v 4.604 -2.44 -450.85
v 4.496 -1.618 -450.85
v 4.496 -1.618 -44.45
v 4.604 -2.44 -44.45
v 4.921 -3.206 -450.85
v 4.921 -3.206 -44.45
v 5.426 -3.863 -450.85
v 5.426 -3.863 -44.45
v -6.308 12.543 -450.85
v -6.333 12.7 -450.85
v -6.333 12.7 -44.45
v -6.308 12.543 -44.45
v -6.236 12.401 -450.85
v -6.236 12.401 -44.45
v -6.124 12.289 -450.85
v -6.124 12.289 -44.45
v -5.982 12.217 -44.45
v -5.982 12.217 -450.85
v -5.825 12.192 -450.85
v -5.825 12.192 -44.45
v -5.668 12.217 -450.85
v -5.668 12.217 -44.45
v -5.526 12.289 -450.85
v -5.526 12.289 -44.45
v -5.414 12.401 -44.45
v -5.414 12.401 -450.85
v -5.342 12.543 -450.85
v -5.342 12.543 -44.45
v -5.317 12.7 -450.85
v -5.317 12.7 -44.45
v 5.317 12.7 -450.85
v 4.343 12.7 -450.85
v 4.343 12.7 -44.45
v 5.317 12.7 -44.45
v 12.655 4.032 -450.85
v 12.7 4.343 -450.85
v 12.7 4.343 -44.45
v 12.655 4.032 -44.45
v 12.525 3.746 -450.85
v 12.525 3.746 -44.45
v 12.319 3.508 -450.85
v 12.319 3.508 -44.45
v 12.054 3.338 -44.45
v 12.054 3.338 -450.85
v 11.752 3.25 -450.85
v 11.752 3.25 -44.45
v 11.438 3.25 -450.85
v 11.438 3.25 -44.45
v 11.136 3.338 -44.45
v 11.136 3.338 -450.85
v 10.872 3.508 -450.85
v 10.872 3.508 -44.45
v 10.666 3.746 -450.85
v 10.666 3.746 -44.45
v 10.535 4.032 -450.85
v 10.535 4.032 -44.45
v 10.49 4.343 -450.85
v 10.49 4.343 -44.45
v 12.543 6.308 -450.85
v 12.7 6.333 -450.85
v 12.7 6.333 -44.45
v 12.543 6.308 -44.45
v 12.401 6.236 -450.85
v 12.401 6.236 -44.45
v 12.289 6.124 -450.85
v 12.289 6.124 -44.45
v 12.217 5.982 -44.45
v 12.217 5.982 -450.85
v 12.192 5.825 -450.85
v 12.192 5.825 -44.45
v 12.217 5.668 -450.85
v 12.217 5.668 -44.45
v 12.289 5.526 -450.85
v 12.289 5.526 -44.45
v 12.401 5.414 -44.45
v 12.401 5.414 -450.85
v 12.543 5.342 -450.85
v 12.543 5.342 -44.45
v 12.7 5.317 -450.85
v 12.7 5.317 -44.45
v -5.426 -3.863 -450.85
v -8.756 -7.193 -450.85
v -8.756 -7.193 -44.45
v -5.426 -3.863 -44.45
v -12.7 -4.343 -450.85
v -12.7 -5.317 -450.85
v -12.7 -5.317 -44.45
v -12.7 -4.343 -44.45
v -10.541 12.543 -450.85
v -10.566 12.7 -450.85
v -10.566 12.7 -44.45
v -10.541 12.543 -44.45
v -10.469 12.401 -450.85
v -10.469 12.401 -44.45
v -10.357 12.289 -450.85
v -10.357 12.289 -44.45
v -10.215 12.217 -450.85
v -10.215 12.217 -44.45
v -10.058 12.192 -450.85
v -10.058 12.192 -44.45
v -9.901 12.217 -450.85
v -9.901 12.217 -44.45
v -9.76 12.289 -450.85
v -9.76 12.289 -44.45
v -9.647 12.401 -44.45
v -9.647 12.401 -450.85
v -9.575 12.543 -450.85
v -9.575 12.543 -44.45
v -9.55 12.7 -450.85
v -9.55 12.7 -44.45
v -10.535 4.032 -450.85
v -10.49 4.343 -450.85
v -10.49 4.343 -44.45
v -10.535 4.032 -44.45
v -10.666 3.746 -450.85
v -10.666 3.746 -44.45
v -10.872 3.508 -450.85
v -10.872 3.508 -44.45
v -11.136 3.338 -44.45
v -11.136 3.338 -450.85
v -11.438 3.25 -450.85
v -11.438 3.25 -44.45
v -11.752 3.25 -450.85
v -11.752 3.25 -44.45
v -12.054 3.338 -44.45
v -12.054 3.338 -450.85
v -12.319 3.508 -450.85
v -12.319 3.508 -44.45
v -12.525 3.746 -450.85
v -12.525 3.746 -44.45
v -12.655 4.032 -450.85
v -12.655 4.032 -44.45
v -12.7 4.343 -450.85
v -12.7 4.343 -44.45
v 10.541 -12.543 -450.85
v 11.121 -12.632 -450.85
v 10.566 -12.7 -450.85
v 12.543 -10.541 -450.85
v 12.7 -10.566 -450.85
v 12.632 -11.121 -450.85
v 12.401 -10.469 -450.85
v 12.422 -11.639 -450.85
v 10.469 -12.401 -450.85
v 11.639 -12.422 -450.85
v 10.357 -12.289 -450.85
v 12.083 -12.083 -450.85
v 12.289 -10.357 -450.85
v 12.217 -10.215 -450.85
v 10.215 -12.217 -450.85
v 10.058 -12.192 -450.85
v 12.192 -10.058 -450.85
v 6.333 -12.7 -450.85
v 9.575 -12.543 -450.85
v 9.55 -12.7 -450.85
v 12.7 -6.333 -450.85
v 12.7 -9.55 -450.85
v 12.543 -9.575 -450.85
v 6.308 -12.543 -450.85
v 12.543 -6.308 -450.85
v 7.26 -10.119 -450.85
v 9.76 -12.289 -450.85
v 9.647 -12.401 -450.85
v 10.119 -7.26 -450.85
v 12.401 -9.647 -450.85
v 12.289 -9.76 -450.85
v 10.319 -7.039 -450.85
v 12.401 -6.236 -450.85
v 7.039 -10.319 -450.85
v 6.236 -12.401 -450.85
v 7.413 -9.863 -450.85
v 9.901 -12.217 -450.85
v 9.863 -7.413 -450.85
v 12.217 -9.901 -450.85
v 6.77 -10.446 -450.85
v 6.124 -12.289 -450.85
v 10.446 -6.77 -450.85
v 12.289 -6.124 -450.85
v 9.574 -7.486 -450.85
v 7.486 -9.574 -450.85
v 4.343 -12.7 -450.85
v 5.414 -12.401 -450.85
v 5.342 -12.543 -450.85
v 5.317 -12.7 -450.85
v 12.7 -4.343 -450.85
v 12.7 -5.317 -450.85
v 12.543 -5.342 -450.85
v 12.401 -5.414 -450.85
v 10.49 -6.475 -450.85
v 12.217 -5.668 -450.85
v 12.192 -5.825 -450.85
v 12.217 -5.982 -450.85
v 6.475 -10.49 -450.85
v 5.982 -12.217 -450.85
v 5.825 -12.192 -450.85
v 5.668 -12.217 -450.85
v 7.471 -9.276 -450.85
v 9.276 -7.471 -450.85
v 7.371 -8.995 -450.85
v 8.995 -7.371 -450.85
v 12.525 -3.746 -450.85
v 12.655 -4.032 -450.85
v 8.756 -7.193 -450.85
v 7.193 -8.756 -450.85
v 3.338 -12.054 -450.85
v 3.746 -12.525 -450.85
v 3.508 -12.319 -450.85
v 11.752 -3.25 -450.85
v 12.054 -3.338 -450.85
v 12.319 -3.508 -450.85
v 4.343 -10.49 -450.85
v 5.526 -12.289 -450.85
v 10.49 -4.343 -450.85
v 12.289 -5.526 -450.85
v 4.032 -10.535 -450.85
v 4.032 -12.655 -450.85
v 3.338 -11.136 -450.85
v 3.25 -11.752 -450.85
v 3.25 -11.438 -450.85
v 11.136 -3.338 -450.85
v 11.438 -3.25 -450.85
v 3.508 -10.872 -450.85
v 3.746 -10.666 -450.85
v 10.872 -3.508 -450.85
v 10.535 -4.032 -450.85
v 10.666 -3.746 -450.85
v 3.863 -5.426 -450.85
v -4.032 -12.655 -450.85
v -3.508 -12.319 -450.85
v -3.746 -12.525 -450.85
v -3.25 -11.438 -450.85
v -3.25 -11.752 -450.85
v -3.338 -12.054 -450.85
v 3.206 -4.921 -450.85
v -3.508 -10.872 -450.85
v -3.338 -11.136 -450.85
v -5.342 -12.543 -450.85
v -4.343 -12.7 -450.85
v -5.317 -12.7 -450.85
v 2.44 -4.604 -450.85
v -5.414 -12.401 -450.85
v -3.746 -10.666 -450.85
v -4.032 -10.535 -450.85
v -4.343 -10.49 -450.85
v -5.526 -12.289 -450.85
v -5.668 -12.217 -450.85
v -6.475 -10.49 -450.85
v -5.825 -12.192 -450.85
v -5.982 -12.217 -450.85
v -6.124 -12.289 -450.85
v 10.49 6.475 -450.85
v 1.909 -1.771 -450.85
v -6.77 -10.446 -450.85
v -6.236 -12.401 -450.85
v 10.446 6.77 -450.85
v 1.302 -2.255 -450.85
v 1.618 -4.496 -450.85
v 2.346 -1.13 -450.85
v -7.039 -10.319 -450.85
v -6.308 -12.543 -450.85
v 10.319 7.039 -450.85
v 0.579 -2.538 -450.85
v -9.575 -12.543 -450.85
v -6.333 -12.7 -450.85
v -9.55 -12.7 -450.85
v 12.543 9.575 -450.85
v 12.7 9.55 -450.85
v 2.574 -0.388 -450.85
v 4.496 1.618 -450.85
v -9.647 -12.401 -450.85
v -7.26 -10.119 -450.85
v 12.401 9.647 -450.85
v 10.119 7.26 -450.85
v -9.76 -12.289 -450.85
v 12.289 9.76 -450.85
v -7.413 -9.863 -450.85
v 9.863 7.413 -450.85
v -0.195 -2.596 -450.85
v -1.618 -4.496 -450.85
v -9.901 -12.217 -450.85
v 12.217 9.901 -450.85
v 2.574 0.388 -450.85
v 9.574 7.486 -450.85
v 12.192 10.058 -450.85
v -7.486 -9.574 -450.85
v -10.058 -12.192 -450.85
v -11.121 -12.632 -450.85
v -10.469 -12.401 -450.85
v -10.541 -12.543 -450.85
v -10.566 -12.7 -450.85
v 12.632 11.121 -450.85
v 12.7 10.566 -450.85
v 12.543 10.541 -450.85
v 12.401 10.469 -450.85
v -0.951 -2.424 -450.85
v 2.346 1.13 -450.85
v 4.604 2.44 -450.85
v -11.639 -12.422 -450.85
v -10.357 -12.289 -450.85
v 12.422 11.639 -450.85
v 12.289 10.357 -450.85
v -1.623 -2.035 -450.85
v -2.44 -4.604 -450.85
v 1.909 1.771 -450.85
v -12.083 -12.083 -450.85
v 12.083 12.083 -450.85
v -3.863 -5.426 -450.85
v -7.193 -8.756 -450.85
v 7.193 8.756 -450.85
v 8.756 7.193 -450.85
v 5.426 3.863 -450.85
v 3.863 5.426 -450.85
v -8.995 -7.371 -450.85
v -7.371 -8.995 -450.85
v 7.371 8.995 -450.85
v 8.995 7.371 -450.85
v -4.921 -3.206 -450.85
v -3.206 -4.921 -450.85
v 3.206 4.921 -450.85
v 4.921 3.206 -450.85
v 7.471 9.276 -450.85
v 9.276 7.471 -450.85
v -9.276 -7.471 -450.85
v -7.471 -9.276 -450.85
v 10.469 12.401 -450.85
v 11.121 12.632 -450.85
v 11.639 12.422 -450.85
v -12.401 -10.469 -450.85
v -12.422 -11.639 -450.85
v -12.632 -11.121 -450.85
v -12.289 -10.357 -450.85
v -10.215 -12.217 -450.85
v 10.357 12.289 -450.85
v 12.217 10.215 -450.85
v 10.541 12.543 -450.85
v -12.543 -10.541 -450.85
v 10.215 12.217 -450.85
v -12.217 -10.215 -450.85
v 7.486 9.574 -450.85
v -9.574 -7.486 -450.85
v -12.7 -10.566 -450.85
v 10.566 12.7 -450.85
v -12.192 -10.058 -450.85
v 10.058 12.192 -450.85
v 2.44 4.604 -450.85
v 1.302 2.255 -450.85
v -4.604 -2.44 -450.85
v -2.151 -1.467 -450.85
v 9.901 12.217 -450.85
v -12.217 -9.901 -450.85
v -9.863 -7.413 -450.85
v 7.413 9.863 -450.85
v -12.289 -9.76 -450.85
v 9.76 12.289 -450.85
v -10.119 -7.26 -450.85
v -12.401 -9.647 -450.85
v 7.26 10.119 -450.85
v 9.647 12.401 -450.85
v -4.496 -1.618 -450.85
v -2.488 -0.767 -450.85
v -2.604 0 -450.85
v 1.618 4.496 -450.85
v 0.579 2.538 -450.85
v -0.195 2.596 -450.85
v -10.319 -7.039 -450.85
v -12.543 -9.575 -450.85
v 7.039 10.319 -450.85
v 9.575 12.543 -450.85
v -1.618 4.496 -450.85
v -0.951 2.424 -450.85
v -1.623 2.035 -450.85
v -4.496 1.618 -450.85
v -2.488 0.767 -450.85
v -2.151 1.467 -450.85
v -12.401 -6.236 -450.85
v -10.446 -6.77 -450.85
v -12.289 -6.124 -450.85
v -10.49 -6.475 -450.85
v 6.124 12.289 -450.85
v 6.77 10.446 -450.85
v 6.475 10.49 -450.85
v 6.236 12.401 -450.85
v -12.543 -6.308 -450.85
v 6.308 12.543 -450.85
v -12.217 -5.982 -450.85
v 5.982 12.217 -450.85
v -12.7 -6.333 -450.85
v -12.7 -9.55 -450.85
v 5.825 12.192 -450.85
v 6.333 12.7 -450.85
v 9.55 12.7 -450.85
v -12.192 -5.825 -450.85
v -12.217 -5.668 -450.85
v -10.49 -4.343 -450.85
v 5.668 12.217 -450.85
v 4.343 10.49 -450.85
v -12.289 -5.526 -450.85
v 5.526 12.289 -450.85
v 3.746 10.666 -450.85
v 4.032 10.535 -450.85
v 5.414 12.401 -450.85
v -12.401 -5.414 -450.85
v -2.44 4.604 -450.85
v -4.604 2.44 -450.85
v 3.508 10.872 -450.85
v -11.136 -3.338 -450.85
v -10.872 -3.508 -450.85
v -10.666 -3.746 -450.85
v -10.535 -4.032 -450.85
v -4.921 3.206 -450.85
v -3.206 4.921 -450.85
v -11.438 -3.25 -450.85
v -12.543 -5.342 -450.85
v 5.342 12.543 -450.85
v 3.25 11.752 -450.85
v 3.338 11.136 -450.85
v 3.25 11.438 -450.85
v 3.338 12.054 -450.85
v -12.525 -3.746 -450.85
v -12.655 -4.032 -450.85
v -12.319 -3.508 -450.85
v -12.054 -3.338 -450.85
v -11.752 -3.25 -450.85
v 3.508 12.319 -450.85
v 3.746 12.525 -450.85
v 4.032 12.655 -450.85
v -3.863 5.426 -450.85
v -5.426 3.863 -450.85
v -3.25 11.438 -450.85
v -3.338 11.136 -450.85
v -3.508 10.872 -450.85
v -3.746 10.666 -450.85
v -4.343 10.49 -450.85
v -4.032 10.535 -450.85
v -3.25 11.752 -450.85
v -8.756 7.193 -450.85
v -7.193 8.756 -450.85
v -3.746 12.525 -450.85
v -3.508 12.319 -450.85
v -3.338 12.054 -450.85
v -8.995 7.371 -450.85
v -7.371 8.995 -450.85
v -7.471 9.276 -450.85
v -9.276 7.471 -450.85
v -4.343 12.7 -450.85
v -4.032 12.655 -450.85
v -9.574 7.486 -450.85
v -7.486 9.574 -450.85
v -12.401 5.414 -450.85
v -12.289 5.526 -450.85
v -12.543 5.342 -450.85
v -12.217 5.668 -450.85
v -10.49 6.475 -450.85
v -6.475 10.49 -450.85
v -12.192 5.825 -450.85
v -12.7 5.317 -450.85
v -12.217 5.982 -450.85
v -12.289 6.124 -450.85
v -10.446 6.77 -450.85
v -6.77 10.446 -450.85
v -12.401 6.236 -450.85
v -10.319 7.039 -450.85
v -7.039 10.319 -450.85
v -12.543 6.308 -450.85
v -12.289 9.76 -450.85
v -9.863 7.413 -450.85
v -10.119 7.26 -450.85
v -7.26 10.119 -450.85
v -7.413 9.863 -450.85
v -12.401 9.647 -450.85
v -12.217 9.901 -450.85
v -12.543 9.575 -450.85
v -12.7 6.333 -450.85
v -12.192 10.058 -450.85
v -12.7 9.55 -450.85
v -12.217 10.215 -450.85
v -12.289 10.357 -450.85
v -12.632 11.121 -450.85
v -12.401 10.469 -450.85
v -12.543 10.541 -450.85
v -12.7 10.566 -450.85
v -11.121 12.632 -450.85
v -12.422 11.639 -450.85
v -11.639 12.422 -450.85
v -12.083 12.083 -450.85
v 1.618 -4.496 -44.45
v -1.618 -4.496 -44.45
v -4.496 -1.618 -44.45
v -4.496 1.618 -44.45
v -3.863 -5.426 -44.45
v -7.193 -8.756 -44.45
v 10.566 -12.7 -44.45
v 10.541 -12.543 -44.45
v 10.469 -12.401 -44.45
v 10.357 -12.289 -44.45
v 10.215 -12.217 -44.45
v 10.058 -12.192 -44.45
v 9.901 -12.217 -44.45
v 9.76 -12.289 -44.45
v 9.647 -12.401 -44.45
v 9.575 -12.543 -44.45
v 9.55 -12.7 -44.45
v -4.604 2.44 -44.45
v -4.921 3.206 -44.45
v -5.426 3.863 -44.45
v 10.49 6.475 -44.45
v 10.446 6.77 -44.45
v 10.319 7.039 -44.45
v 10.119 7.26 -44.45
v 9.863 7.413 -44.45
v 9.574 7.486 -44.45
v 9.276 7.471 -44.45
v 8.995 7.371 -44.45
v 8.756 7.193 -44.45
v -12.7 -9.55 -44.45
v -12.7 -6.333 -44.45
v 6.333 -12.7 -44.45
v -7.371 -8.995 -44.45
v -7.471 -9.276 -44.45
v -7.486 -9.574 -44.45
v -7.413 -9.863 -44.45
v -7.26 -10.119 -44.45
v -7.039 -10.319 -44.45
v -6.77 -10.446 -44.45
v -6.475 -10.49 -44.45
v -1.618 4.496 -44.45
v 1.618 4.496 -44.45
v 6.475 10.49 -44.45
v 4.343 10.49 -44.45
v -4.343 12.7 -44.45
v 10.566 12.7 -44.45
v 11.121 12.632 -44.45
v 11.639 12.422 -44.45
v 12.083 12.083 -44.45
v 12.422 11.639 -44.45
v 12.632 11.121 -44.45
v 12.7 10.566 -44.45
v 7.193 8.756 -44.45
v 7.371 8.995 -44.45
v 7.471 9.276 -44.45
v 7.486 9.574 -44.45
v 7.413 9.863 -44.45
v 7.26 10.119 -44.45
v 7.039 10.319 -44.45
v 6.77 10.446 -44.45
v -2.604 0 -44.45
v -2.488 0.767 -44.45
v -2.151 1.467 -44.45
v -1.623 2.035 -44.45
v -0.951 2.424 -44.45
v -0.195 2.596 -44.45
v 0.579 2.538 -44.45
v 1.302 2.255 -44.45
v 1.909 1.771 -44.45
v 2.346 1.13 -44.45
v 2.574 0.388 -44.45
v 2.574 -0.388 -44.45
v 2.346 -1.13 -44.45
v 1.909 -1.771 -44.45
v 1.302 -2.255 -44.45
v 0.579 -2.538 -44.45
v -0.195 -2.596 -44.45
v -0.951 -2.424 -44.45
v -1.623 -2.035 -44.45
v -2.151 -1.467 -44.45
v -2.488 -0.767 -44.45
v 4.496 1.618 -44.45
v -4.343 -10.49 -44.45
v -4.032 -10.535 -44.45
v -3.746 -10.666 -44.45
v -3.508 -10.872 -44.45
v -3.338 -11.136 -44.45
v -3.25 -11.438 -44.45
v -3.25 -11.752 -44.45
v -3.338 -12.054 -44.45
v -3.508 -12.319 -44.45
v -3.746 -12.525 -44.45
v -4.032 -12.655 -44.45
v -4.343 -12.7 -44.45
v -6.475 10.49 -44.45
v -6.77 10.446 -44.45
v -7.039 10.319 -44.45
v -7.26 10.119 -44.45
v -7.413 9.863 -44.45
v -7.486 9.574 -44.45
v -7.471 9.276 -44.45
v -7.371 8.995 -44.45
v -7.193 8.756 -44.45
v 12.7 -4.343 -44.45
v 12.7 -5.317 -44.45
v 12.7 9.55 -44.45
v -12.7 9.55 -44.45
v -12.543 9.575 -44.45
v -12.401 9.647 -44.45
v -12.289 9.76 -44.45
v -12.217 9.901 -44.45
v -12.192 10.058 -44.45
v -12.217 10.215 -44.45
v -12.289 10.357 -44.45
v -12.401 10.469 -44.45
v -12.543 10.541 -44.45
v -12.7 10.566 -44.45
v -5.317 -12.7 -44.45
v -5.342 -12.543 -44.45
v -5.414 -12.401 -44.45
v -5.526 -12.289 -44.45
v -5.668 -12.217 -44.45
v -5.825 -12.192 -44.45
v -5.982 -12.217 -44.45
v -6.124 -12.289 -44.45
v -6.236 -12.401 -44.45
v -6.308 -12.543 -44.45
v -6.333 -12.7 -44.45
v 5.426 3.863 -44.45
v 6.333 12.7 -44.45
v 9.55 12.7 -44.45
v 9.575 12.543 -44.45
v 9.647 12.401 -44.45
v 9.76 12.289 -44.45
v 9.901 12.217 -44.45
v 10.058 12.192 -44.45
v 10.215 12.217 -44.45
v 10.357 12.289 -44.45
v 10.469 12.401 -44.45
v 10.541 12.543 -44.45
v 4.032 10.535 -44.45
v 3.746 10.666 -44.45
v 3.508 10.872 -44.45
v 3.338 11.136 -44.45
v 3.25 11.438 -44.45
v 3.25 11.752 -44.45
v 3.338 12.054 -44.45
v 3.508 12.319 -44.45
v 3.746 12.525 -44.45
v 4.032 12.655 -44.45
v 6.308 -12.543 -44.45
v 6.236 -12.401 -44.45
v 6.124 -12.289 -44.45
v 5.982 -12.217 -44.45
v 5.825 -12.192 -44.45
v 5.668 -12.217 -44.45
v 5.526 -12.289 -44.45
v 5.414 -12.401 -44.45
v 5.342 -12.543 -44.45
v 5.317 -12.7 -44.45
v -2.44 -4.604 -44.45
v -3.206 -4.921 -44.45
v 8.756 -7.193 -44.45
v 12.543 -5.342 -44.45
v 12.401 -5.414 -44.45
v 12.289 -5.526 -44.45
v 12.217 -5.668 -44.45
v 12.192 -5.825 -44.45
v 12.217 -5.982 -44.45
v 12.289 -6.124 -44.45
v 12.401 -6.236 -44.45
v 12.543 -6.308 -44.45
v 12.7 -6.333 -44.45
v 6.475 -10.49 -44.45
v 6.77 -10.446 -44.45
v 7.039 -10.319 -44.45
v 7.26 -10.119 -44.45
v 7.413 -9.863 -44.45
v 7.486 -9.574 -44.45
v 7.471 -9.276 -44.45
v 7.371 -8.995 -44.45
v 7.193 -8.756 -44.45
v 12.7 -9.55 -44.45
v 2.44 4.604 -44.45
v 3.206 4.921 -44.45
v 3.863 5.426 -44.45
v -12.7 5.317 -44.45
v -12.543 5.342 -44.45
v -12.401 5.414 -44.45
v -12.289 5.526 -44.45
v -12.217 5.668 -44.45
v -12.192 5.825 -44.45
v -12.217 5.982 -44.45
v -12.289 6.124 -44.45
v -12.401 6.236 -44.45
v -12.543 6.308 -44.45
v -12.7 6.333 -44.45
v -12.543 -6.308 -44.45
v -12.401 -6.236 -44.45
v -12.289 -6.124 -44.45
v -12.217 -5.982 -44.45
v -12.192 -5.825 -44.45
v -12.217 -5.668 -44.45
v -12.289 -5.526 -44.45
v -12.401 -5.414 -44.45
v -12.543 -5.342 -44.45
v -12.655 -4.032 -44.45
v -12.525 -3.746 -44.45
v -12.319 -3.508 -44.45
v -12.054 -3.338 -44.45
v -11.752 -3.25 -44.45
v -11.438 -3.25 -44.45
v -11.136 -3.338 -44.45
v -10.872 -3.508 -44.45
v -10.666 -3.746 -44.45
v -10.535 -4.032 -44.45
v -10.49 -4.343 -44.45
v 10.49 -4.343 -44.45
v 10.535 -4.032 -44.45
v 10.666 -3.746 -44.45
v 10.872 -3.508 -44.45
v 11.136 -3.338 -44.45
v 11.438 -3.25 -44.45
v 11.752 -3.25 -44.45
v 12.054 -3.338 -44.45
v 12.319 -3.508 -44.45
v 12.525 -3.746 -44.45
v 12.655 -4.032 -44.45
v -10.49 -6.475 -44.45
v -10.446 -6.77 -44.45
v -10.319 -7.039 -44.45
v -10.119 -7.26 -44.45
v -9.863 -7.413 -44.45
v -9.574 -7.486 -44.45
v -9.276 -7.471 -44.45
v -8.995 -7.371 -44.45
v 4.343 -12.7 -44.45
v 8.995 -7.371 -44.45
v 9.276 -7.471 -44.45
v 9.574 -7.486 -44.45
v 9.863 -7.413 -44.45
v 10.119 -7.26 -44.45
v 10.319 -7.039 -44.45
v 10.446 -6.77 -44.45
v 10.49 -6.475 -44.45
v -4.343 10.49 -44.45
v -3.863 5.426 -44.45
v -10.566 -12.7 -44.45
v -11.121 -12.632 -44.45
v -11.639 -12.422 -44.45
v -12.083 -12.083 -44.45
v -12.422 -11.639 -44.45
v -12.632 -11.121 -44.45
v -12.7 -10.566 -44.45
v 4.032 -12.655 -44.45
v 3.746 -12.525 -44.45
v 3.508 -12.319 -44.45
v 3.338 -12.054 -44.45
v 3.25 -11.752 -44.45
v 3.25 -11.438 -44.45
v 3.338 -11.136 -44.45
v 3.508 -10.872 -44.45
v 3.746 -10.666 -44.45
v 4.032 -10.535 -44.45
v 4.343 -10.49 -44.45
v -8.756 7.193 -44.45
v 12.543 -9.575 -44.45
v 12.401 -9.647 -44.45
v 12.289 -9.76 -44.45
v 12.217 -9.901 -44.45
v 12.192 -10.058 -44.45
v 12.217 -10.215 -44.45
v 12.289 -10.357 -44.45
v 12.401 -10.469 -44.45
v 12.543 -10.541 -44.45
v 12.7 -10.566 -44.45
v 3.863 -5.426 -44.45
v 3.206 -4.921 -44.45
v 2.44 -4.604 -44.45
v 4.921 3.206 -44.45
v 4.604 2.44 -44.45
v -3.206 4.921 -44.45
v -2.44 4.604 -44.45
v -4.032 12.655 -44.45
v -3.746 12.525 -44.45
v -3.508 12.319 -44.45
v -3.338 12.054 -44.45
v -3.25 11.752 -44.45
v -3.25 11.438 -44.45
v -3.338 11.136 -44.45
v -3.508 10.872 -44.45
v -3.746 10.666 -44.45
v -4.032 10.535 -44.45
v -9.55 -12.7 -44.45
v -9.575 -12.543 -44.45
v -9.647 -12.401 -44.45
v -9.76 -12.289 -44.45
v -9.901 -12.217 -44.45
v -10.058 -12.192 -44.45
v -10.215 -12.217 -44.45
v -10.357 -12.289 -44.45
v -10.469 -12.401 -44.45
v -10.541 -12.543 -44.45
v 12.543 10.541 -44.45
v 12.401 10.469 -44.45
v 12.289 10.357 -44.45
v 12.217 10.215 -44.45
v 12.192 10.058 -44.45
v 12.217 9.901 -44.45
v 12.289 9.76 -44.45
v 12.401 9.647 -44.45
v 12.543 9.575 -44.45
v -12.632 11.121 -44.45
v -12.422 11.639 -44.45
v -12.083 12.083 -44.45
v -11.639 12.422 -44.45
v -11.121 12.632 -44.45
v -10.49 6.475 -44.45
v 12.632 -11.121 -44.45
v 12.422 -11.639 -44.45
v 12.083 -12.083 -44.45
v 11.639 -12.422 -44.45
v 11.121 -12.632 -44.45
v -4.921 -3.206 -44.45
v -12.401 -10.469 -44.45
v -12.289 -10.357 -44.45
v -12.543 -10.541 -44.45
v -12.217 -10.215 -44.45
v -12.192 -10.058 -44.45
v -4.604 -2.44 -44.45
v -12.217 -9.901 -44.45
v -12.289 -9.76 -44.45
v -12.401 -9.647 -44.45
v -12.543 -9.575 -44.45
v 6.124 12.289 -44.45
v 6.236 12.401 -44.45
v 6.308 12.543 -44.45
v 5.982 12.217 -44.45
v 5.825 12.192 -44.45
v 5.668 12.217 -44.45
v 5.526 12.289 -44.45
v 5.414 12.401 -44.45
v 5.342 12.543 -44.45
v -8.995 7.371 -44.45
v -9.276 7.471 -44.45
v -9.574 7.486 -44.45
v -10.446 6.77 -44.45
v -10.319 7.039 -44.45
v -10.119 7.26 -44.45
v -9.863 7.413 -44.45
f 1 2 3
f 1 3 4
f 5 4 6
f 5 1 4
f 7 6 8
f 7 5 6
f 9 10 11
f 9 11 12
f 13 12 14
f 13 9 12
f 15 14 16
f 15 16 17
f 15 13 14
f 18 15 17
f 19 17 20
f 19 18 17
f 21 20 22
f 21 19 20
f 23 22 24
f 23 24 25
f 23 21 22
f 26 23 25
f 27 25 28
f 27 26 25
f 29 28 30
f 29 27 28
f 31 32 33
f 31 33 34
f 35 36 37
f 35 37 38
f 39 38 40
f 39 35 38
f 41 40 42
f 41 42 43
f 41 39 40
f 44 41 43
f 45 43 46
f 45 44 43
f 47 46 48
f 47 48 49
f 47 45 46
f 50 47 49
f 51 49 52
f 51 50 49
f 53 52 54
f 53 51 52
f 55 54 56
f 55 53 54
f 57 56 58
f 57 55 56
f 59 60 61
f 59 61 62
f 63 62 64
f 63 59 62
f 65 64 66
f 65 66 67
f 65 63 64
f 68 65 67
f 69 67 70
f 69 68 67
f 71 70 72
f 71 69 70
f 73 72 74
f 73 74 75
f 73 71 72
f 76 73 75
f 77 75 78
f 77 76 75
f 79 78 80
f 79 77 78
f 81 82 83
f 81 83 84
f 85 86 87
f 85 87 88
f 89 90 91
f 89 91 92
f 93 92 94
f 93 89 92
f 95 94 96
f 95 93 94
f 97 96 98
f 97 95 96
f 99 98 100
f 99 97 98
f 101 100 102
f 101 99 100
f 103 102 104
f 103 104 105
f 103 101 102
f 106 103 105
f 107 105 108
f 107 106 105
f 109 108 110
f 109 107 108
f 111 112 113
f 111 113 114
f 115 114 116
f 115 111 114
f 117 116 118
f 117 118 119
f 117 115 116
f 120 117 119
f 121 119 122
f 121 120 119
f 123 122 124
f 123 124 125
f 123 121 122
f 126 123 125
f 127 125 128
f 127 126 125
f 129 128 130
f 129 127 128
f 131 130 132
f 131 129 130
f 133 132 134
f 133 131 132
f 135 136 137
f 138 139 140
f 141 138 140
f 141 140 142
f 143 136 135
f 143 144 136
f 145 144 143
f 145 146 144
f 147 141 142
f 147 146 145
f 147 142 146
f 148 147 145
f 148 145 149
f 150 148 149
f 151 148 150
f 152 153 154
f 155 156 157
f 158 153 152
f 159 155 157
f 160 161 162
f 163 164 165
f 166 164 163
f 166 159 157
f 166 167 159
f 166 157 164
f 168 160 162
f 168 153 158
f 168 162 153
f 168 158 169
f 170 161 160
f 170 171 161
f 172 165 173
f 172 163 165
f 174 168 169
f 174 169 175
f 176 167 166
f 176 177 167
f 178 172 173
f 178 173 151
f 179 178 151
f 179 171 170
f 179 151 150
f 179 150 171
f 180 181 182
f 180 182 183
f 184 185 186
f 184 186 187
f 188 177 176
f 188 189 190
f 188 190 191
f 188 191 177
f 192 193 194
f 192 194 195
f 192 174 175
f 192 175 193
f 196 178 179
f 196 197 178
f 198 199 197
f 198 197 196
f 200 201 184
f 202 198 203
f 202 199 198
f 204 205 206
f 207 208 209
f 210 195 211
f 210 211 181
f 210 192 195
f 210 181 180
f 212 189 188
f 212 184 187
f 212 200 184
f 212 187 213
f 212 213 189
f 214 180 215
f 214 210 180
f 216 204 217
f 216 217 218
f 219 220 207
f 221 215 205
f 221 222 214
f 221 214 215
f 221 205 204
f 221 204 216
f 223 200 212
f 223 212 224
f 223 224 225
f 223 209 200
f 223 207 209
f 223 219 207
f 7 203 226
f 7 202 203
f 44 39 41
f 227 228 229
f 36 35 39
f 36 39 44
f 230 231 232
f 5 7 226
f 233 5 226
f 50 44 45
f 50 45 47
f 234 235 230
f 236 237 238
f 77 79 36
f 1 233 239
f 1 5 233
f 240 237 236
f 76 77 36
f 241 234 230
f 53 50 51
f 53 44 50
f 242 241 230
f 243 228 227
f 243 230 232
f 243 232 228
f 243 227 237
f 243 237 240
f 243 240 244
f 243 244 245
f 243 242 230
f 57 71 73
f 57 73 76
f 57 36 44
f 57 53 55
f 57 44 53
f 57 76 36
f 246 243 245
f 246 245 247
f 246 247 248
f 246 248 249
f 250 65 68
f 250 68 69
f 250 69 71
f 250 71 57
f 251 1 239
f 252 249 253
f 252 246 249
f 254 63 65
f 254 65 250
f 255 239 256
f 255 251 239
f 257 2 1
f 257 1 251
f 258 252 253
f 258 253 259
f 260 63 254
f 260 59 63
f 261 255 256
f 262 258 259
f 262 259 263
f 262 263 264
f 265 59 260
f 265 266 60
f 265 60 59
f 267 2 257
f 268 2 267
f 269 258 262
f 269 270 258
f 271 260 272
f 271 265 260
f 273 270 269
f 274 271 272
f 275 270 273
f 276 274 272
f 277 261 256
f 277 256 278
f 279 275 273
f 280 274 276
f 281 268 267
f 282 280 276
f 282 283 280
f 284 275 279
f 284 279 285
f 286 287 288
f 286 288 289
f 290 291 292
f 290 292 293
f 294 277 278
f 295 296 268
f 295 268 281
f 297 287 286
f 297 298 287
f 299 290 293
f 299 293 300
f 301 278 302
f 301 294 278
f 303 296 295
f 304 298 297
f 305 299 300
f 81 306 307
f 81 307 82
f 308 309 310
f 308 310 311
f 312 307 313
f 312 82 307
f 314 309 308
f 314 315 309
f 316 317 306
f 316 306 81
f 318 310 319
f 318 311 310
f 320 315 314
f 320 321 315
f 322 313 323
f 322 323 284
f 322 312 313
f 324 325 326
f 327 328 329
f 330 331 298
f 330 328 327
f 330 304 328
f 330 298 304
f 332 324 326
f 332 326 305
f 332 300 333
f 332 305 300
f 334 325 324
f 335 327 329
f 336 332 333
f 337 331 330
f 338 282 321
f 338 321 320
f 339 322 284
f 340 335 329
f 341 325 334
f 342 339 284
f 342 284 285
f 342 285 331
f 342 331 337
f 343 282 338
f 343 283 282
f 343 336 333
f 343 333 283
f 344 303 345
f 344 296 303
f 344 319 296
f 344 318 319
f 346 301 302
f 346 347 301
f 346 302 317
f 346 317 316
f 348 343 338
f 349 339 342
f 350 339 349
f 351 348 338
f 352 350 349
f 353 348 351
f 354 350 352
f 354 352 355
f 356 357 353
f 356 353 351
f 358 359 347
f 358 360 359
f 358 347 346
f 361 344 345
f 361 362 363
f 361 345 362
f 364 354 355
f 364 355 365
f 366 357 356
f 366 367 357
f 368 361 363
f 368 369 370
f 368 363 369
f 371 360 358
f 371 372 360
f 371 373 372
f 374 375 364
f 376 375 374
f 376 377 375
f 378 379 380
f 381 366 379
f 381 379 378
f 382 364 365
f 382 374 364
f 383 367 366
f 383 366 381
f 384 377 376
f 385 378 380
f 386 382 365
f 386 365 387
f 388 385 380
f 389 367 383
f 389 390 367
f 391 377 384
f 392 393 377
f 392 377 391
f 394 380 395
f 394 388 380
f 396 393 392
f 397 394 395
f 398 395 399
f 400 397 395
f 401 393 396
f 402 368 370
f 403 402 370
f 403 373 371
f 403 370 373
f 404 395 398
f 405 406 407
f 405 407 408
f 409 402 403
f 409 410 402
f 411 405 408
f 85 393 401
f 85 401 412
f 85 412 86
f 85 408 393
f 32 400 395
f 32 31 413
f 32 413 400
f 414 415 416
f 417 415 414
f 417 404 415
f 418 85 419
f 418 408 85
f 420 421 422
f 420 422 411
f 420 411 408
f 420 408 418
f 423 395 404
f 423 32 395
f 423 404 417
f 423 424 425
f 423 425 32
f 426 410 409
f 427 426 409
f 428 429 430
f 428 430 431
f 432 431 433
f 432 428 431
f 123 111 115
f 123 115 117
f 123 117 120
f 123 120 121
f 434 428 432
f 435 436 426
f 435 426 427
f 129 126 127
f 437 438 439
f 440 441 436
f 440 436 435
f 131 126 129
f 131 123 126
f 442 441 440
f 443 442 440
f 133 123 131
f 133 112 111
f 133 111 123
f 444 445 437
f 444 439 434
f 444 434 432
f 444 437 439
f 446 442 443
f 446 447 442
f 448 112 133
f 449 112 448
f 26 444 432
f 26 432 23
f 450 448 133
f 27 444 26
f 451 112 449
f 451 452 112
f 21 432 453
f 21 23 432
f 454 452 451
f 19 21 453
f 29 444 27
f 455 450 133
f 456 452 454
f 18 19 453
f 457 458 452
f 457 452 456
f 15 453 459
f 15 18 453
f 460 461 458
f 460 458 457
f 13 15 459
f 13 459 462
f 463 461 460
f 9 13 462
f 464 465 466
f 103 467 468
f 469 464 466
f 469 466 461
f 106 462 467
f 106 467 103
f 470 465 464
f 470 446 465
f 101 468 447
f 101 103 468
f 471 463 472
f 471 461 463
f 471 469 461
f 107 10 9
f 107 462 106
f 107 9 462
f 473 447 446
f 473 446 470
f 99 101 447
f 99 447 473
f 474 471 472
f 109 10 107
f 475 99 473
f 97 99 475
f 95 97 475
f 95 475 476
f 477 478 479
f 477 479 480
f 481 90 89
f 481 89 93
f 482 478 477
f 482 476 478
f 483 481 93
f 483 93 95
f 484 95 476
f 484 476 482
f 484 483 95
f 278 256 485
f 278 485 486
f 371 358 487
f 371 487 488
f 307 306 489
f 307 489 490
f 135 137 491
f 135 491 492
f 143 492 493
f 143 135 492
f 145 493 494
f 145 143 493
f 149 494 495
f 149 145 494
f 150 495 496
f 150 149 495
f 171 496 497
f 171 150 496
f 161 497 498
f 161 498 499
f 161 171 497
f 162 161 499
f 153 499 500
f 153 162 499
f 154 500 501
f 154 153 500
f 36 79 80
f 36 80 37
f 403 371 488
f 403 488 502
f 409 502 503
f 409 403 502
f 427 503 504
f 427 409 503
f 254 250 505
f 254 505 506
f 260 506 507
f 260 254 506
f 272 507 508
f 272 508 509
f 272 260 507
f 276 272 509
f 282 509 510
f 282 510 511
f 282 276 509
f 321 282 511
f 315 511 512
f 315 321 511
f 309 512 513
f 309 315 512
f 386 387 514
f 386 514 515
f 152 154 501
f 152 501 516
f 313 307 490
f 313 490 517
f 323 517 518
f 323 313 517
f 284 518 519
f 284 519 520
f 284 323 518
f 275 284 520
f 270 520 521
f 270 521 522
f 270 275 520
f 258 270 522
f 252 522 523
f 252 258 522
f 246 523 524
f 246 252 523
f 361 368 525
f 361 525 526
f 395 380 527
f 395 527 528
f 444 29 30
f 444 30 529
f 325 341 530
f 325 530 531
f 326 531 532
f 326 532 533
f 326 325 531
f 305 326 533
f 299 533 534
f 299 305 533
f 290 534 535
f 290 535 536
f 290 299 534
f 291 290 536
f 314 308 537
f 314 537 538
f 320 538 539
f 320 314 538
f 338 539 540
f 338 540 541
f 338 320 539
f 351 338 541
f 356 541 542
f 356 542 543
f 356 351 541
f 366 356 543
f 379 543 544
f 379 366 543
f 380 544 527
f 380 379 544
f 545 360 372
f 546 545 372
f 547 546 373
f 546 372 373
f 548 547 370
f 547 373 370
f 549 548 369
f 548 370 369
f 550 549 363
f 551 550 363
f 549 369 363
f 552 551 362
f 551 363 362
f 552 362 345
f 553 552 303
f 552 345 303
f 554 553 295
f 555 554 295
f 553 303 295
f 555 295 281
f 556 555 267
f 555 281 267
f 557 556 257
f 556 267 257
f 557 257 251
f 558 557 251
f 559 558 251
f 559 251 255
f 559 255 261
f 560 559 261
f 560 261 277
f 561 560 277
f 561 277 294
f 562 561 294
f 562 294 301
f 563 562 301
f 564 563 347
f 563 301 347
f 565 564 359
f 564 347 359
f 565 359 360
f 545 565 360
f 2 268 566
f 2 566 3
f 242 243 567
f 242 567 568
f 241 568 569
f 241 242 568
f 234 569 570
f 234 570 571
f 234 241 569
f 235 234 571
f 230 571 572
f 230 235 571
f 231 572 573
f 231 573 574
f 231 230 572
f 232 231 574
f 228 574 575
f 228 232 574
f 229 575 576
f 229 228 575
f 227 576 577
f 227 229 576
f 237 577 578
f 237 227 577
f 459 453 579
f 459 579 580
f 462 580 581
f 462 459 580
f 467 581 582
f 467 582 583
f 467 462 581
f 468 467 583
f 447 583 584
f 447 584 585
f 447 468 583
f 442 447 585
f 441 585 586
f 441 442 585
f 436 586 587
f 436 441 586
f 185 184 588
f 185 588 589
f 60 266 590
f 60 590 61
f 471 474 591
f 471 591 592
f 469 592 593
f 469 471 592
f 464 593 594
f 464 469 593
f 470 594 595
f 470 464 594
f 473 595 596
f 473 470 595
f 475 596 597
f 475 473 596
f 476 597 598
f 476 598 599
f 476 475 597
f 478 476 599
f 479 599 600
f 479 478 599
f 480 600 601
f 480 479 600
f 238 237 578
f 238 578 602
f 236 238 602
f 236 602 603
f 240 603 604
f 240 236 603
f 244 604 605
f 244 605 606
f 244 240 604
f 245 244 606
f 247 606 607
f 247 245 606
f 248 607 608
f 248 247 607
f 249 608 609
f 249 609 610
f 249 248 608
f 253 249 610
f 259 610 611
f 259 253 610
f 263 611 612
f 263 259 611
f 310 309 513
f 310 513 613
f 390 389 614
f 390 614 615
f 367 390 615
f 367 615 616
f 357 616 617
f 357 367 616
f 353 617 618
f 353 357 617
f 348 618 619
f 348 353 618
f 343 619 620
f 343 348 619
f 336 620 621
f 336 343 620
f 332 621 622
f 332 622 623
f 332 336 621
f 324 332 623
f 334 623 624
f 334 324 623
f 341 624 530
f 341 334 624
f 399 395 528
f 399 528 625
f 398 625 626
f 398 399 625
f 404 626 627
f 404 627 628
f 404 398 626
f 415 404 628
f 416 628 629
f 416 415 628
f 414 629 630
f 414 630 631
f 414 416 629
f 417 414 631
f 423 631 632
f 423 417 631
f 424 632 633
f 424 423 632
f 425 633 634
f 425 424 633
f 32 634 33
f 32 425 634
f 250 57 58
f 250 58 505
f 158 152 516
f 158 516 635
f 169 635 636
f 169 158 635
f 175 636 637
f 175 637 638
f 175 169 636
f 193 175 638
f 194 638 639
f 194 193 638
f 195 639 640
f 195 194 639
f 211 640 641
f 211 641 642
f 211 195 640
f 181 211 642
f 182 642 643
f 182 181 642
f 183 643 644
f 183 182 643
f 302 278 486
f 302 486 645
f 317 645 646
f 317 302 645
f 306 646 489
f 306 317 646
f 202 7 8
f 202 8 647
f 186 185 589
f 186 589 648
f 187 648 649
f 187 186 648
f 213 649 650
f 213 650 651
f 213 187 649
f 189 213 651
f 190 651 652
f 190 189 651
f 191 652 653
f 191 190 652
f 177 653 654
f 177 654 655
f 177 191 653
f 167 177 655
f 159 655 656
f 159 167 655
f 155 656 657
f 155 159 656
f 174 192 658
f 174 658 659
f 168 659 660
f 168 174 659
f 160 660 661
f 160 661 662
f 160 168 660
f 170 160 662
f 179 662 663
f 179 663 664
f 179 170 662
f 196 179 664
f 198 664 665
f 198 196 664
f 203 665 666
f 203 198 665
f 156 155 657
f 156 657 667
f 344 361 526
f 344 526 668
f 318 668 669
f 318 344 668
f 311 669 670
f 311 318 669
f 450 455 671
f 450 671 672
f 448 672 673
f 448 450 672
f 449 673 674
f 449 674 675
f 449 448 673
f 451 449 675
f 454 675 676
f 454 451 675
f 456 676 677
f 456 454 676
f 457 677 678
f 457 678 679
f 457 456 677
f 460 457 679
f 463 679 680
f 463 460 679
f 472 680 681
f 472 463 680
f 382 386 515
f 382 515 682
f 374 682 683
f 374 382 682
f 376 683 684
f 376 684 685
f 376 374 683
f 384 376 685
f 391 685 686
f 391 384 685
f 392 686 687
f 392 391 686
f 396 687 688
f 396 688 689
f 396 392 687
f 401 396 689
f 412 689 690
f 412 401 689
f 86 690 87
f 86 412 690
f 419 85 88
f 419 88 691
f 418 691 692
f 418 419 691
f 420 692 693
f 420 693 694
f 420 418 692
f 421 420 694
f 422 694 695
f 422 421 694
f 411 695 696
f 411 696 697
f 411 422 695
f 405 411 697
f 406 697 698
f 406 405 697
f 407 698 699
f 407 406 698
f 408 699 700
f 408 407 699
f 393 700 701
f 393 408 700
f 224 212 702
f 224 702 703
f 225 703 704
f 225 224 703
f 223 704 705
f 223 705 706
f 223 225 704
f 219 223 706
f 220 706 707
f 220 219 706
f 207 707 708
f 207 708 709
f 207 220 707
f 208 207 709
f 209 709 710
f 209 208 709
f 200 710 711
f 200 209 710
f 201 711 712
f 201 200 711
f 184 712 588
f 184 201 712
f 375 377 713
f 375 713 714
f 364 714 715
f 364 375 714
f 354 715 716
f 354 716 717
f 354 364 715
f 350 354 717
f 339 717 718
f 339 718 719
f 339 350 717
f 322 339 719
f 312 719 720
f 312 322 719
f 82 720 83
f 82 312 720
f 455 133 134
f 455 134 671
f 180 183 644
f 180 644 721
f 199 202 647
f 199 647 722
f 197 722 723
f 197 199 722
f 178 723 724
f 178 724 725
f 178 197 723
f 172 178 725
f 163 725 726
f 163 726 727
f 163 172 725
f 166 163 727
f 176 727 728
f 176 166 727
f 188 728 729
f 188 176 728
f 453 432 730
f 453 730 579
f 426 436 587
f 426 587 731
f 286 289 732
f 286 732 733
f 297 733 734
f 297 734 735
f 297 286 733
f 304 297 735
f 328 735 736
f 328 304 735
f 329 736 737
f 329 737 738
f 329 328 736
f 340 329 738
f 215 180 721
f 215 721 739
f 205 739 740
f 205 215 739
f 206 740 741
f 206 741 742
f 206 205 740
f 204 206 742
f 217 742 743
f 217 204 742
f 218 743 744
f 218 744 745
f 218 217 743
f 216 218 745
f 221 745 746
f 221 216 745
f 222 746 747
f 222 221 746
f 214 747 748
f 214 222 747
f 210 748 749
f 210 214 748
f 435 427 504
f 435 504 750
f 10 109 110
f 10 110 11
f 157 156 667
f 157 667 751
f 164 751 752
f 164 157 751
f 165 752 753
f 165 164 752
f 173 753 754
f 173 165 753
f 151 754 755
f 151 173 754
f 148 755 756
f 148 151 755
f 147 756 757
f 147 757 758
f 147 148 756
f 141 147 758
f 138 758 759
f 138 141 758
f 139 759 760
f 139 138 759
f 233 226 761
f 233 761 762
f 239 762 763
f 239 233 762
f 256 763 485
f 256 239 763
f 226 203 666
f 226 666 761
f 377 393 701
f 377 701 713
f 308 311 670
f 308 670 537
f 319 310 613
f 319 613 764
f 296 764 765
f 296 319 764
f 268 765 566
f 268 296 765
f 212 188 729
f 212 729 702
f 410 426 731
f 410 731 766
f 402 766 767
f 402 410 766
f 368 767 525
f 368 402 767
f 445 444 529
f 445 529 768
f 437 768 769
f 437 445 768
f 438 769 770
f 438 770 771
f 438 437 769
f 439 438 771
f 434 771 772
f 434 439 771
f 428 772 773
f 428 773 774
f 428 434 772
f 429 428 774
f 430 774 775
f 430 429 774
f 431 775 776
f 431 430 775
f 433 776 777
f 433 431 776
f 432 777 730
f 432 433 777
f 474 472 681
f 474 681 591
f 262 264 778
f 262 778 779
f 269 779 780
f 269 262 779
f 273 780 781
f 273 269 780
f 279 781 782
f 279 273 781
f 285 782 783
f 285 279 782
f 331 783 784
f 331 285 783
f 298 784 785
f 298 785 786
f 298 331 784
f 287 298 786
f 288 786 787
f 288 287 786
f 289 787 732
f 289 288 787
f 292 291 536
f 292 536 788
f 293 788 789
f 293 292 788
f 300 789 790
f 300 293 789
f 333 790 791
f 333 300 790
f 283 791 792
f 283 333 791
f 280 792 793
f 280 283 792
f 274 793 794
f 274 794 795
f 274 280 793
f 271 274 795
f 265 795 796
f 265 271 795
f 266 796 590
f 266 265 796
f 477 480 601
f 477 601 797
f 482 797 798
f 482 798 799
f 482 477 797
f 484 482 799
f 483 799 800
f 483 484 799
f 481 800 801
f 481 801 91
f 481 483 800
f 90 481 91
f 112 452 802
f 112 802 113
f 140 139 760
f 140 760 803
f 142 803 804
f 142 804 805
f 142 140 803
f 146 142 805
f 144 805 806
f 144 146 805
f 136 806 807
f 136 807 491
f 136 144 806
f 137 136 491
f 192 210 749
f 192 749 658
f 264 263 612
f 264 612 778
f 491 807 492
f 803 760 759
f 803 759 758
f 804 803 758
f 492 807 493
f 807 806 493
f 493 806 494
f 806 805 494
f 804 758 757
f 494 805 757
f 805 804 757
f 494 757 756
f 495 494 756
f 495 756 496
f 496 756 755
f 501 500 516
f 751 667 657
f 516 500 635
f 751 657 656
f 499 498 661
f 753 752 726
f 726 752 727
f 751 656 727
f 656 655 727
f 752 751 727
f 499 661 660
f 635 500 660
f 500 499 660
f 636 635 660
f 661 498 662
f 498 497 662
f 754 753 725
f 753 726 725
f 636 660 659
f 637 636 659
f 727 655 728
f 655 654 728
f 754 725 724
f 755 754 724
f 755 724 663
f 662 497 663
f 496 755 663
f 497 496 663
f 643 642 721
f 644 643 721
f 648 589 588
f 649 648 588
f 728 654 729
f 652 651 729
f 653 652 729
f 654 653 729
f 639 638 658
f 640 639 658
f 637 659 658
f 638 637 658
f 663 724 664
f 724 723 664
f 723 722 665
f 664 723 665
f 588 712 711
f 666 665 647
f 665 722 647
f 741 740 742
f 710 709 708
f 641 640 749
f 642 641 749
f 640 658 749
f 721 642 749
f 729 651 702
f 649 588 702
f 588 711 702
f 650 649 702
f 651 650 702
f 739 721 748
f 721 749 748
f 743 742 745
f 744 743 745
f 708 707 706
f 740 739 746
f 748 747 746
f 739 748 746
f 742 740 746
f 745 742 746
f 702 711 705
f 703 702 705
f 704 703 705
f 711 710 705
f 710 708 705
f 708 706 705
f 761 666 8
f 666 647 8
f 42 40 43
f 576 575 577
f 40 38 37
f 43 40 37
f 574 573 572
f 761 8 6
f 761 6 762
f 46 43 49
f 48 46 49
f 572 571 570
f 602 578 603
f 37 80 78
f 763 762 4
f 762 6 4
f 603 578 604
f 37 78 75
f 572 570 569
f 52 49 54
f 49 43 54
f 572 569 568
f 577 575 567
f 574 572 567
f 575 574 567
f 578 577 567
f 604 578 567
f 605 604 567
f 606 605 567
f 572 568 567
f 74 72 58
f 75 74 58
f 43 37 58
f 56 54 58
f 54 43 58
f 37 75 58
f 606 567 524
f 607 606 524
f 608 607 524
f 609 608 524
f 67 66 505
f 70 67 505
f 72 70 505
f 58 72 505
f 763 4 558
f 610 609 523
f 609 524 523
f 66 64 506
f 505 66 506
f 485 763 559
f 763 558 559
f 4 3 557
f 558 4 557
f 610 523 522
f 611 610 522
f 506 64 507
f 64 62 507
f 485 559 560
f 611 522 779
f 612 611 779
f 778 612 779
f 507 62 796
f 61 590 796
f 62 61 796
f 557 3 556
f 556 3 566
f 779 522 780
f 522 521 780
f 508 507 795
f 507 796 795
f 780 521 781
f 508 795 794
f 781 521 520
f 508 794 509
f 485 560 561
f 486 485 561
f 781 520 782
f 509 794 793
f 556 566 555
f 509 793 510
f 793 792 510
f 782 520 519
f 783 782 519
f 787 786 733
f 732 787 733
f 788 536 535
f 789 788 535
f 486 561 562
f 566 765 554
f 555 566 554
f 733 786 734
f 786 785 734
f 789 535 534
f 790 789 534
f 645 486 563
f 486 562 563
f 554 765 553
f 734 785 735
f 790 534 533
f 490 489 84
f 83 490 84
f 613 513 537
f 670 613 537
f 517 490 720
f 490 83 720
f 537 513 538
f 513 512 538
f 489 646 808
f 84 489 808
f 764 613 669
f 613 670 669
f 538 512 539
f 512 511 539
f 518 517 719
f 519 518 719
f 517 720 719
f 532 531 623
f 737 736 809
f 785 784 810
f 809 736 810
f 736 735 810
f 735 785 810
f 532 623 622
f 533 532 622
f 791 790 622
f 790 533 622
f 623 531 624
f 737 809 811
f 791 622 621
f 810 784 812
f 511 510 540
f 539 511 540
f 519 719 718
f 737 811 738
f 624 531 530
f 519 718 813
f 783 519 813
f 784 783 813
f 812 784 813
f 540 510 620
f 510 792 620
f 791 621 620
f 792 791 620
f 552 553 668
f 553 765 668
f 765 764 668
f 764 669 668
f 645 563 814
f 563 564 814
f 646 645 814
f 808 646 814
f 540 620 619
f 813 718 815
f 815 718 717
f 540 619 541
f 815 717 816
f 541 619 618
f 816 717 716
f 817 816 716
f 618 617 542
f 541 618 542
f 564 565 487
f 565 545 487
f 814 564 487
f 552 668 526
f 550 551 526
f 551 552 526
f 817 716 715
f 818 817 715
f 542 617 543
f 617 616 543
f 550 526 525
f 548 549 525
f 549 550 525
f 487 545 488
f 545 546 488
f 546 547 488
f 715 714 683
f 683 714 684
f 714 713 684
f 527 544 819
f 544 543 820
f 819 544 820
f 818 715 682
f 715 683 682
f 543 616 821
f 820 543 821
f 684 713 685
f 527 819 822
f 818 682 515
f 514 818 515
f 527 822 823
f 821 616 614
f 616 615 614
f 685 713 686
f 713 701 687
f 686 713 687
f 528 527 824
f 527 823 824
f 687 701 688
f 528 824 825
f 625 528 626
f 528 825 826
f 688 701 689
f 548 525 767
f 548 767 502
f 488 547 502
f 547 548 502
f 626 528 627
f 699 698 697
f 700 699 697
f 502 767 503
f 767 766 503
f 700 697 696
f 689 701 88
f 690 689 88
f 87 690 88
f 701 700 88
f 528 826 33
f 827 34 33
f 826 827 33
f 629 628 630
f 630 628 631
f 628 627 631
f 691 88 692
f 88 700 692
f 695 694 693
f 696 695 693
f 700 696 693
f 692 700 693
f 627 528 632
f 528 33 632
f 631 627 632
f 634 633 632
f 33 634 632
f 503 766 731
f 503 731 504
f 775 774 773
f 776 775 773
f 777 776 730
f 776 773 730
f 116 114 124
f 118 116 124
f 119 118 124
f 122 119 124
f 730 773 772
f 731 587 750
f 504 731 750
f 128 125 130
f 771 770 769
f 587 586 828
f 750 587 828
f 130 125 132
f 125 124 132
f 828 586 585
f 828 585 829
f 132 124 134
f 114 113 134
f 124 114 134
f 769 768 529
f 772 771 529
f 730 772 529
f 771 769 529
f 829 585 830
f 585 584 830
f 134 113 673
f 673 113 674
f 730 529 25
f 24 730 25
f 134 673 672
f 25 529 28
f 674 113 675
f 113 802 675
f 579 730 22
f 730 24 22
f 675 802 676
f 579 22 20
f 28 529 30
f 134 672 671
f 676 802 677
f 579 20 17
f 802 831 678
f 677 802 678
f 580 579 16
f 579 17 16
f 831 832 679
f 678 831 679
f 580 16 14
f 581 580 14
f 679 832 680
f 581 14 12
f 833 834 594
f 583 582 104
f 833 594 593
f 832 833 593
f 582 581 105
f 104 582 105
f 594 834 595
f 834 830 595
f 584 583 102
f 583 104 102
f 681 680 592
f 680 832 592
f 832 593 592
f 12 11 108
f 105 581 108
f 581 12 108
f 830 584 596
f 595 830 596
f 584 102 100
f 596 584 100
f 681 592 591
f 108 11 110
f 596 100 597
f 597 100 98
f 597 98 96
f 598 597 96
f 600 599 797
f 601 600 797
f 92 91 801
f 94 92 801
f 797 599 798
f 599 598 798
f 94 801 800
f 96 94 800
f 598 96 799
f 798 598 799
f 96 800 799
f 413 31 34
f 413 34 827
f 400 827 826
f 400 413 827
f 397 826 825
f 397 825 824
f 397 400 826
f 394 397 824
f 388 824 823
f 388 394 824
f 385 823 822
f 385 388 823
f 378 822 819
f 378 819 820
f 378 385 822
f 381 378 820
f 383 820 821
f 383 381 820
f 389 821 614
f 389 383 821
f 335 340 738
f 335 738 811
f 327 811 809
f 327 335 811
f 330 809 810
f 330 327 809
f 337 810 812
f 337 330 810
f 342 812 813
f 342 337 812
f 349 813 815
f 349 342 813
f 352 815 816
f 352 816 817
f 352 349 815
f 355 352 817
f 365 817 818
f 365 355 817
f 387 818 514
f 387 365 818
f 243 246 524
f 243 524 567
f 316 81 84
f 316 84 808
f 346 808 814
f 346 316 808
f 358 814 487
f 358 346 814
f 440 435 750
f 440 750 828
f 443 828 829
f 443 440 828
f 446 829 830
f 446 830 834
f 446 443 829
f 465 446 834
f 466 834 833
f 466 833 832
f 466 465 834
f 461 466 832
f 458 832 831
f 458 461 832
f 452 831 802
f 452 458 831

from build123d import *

# Parameters (mm, degrees)
SKETCH1_R           = 2.6035
BOSS_EXTRUDE1_DEPTH = 406.4


with BuildPart() as part:
    # Sketch1 → Boss-Extrude1 (new body)
    with BuildSketch(Plane(origin=(0, 0, -450.85), x_dir=(-1, 0, 0), z_dir=(0, 0, -1))):
        with BuildLine():
            Line((12.7, -9.5504), (12.7, -6.3330836))
            ThreePointArc((12.7, -6.3330836), (12.192, -5.8250836), (12.7, -5.3170836))
            Line((12.7, -5.3170836), (12.7, -4.3434))
            ThreePointArc((12.7, -4.3434), (11.5951, -3.2385), (10.4902, -4.3434))
            Line((10.4902, -4.3434), (10.4902, -6.474794456))
            ThreePointArc((10.4902, -6.474794456), (9.863006367, -7.413456061), (8.75577951, -7.193214945))
            Line((8.75577951, -7.193214945), (5.42573597, -3.863171405))
            ThreePointArc((5.42573597, -3.863171405), (4.737482484, -2.833127272), (4.4958, -1.618107374))
            Line((4.4958, -1.618107374), (4.4958, 1.618107374))
            ThreePointArc((4.4958, 1.618107374), (4.737482484, 2.833127272), (5.42573597, 3.863171405))
            Line((5.42573597, 3.863171405), (8.75577951, 7.193214945))
            ThreePointArc((8.75577951, 7.193214945), (9.863006367, 7.413456061), (10.4902, 6.474794456))
            Line((10.4902, 6.474794456), (10.4902, 4.343399971))
            ThreePointArc((10.4902, 4.343399971), (11.5951, 3.238499971), (12.7, 4.343399971))
            Line((12.7, 4.343399971), (12.7, 5.3170836))
            ThreePointArc((12.7, 5.3170836), (12.192, 5.8250836), (12.7, 6.3330836))
            Line((12.7, 6.3330836), (12.7, 9.5504))
            ThreePointArc((12.7, 9.5504), (12.192000006, 10.058323491), (12.699846982, 10.566399977))
            ThreePointArc((12.699846982, 10.566399977), (12.082522516, 12.082522516), (10.566399977, 12.699846982))
            ThreePointArc((10.566399977, 12.699846982), (10.058323491, 12.192000006), (9.5504, 12.7))
            Line((9.5504, 12.7), (6.3330836, 12.7))
            ThreePointArc((6.3330836, 12.7), (5.8250836, 12.192), (5.3170836, 12.7))
            Line((5.3170836, 12.7), (4.3434, 12.7))
            ThreePointArc((4.3434, 12.7), (3.2385, 11.5951), (4.3434, 10.4902))
            Line((4.3434, 10.4902), (6.474794456, 10.4902))
            ThreePointArc((6.474794456, 10.4902), (7.413456061, 9.863006367), (7.193214945, 8.75577951))
            Line((7.193214945, 8.75577951), (3.863171405, 5.42573597))
            ThreePointArc((3.863171405, 5.42573597), (2.833127272, 4.737482484), (1.618107374, 4.4958))
            Line((1.618107374, 4.4958), (-1.618107374, 4.4958))
            ThreePointArc((-1.618107374, 4.4958), (-2.833127272, 4.737482484), (-3.863171405, 5.42573597))
            Line((-3.863171405, 5.42573597), (-7.193214945, 8.75577951))
            ThreePointArc((-7.193214945, 8.75577951), (-7.413456061, 9.863006367), (-6.474794456, 10.4902))
            Line((-6.474794456, 10.4902), (-4.343399971, 10.4902))
            ThreePointArc((-4.343399971, 10.4902), (-3.238499971, 11.5951), (-4.343399971, 12.7))
            Line((-4.343399971, 12.7), (-5.3170836, 12.7))
            ThreePointArc((-5.3170836, 12.7), (-5.8250836, 12.192), (-6.3330836, 12.7))
            Line((-6.3330836, 12.7), (-9.5504, 12.7))
            ThreePointArc((-9.5504, 12.7), (-10.058323491, 12.192000006), (-10.566399977, 12.699846982))
            ThreePointArc((-10.566399977, 12.699846982), (-12.082522516, 12.082522516), (-12.699846982, 10.566399977))
            ThreePointArc((-12.699846982, 10.566399977), (-12.192000006, 10.058323491), (-12.7, 9.5504))
            Line((-12.7, 9.5504), (-12.7, 6.3330836))
            ThreePointArc((-12.7, 6.3330836), (-12.192, 5.8250836), (-12.7, 5.3170836))
            Line((-12.7, 5.3170836), (-12.7, 4.3434))
            ThreePointArc((-12.7, 4.3434), (-11.5951, 3.2385), (-10.4902, 4.3434))
            Line((-10.4902, 4.3434), (-10.4902, 6.474794456))
            ThreePointArc((-10.4902, 6.474794456), (-9.863006367, 7.413456061), (-8.75577951, 7.193214945))
            Line((-8.75577951, 7.193214945), (-5.42573597, 3.863171405))
            ThreePointArc((-5.42573597, 3.863171405), (-4.737482484, 2.833127272), (-4.4958, 1.618107374))
            Line((-4.4958, 1.618107374), (-4.4958, -1.618107374))
            ThreePointArc((-4.4958, -1.618107374), (-4.737482484, -2.833127272), (-5.42573597, -3.863171405))
            Line((-5.42573597, -3.863171405), (-8.75577951, -7.193214945))
            ThreePointArc((-8.75577951, -7.193214945), (-9.863006367, -7.413456061), (-10.4902, -6.474794456))
            Line((-10.4902, -6.474794456), (-10.4902, -4.343399971))
            ThreePointArc((-10.4902, -4.343399971), (-11.5951, -3.238499971), (-12.7, -4.343399971))
            Line((-12.7, -4.343399971), (-12.7, -5.3170836))
            ThreePointArc((-12.7, -5.3170836), (-12.192, -5.8250836), (-12.7, -6.3330836))
            Line((-12.7, -6.3330836), (-12.7, -9.5504))
            ThreePointArc((-12.7, -9.5504), (-12.192000006, -10.058323491), (-12.699846982, -10.566399977))
            ThreePointArc((-12.699846982, -10.566399977), (-12.082522516, -12.082522516), (-10.566399977, -12.699846982))
            ThreePointArc((-10.566399977, -12.699846982), (-10.058323491, -12.192000006), (-9.5504, -12.7))
            Line((-9.5504, -12.7), (-6.3330836, -12.7))
            ThreePointArc((-6.3330836, -12.7), (-5.8250836, -12.192), (-5.3170836, -12.7))
            Line((-5.3170836, -12.7), (-4.3434, -12.7))
            ThreePointArc((-4.3434, -12.7), (-3.2385, -11.5951), (-4.3434, -10.4902))
            Line((-4.3434, -10.4902), (-6.474794456, -10.4902))
            ThreePointArc((-6.474794456, -10.4902), (-7.413456061, -9.863006367), (-7.193214945, -8.75577951))
            Line((-7.193214945, -8.75577951), (-3.863171405, -5.42573597))
            ThreePointArc((-3.863171405, -5.42573597), (-2.833127272, -4.737482484), (-1.618107374, -4.4958))
            Line((-1.618107374, -4.4958), (1.618107374, -4.4958))
            ThreePointArc((1.618107374, -4.4958), (2.833127272, -4.737482484), (3.863171405, -5.42573597))
            Line((3.863171405, -5.42573597), (7.193214945, -8.75577951))
            ThreePointArc((7.193214945, -8.75577951), (7.413456061, -9.863006367), (6.474794456, -10.4902))
            Line((6.474794456, -10.4902), (4.343399971, -10.4902))
            ThreePointArc((4.343399971, -10.4902), (3.238499971, -11.5951), (4.343399971, -12.7))
            Line((4.343399971, -12.7), (5.3170836, -12.7))
            ThreePointArc((5.3170836, -12.7), (5.8250836, -12.192), (6.3330836, -12.7))
            Line((6.3330836, -12.7), (9.5504, -12.7))
            ThreePointArc((9.5504, -12.7), (10.058323491, -12.192000006), (10.566399977, -12.699846982))
            ThreePointArc((10.566399977, -12.699846982), (12.082522516, -12.082522516), (12.699846982, -10.566399977))
            ThreePointArc((12.699846982, -10.566399977), (12.192000006, -10.058323491), (12.7, -9.5504))
        make_face()
        Circle(SKETCH1_R, mode=Mode.SUBTRACT)
    extrude(amount=-BOSS_EXTRUDE1_DEPTH)


solid = part.part
